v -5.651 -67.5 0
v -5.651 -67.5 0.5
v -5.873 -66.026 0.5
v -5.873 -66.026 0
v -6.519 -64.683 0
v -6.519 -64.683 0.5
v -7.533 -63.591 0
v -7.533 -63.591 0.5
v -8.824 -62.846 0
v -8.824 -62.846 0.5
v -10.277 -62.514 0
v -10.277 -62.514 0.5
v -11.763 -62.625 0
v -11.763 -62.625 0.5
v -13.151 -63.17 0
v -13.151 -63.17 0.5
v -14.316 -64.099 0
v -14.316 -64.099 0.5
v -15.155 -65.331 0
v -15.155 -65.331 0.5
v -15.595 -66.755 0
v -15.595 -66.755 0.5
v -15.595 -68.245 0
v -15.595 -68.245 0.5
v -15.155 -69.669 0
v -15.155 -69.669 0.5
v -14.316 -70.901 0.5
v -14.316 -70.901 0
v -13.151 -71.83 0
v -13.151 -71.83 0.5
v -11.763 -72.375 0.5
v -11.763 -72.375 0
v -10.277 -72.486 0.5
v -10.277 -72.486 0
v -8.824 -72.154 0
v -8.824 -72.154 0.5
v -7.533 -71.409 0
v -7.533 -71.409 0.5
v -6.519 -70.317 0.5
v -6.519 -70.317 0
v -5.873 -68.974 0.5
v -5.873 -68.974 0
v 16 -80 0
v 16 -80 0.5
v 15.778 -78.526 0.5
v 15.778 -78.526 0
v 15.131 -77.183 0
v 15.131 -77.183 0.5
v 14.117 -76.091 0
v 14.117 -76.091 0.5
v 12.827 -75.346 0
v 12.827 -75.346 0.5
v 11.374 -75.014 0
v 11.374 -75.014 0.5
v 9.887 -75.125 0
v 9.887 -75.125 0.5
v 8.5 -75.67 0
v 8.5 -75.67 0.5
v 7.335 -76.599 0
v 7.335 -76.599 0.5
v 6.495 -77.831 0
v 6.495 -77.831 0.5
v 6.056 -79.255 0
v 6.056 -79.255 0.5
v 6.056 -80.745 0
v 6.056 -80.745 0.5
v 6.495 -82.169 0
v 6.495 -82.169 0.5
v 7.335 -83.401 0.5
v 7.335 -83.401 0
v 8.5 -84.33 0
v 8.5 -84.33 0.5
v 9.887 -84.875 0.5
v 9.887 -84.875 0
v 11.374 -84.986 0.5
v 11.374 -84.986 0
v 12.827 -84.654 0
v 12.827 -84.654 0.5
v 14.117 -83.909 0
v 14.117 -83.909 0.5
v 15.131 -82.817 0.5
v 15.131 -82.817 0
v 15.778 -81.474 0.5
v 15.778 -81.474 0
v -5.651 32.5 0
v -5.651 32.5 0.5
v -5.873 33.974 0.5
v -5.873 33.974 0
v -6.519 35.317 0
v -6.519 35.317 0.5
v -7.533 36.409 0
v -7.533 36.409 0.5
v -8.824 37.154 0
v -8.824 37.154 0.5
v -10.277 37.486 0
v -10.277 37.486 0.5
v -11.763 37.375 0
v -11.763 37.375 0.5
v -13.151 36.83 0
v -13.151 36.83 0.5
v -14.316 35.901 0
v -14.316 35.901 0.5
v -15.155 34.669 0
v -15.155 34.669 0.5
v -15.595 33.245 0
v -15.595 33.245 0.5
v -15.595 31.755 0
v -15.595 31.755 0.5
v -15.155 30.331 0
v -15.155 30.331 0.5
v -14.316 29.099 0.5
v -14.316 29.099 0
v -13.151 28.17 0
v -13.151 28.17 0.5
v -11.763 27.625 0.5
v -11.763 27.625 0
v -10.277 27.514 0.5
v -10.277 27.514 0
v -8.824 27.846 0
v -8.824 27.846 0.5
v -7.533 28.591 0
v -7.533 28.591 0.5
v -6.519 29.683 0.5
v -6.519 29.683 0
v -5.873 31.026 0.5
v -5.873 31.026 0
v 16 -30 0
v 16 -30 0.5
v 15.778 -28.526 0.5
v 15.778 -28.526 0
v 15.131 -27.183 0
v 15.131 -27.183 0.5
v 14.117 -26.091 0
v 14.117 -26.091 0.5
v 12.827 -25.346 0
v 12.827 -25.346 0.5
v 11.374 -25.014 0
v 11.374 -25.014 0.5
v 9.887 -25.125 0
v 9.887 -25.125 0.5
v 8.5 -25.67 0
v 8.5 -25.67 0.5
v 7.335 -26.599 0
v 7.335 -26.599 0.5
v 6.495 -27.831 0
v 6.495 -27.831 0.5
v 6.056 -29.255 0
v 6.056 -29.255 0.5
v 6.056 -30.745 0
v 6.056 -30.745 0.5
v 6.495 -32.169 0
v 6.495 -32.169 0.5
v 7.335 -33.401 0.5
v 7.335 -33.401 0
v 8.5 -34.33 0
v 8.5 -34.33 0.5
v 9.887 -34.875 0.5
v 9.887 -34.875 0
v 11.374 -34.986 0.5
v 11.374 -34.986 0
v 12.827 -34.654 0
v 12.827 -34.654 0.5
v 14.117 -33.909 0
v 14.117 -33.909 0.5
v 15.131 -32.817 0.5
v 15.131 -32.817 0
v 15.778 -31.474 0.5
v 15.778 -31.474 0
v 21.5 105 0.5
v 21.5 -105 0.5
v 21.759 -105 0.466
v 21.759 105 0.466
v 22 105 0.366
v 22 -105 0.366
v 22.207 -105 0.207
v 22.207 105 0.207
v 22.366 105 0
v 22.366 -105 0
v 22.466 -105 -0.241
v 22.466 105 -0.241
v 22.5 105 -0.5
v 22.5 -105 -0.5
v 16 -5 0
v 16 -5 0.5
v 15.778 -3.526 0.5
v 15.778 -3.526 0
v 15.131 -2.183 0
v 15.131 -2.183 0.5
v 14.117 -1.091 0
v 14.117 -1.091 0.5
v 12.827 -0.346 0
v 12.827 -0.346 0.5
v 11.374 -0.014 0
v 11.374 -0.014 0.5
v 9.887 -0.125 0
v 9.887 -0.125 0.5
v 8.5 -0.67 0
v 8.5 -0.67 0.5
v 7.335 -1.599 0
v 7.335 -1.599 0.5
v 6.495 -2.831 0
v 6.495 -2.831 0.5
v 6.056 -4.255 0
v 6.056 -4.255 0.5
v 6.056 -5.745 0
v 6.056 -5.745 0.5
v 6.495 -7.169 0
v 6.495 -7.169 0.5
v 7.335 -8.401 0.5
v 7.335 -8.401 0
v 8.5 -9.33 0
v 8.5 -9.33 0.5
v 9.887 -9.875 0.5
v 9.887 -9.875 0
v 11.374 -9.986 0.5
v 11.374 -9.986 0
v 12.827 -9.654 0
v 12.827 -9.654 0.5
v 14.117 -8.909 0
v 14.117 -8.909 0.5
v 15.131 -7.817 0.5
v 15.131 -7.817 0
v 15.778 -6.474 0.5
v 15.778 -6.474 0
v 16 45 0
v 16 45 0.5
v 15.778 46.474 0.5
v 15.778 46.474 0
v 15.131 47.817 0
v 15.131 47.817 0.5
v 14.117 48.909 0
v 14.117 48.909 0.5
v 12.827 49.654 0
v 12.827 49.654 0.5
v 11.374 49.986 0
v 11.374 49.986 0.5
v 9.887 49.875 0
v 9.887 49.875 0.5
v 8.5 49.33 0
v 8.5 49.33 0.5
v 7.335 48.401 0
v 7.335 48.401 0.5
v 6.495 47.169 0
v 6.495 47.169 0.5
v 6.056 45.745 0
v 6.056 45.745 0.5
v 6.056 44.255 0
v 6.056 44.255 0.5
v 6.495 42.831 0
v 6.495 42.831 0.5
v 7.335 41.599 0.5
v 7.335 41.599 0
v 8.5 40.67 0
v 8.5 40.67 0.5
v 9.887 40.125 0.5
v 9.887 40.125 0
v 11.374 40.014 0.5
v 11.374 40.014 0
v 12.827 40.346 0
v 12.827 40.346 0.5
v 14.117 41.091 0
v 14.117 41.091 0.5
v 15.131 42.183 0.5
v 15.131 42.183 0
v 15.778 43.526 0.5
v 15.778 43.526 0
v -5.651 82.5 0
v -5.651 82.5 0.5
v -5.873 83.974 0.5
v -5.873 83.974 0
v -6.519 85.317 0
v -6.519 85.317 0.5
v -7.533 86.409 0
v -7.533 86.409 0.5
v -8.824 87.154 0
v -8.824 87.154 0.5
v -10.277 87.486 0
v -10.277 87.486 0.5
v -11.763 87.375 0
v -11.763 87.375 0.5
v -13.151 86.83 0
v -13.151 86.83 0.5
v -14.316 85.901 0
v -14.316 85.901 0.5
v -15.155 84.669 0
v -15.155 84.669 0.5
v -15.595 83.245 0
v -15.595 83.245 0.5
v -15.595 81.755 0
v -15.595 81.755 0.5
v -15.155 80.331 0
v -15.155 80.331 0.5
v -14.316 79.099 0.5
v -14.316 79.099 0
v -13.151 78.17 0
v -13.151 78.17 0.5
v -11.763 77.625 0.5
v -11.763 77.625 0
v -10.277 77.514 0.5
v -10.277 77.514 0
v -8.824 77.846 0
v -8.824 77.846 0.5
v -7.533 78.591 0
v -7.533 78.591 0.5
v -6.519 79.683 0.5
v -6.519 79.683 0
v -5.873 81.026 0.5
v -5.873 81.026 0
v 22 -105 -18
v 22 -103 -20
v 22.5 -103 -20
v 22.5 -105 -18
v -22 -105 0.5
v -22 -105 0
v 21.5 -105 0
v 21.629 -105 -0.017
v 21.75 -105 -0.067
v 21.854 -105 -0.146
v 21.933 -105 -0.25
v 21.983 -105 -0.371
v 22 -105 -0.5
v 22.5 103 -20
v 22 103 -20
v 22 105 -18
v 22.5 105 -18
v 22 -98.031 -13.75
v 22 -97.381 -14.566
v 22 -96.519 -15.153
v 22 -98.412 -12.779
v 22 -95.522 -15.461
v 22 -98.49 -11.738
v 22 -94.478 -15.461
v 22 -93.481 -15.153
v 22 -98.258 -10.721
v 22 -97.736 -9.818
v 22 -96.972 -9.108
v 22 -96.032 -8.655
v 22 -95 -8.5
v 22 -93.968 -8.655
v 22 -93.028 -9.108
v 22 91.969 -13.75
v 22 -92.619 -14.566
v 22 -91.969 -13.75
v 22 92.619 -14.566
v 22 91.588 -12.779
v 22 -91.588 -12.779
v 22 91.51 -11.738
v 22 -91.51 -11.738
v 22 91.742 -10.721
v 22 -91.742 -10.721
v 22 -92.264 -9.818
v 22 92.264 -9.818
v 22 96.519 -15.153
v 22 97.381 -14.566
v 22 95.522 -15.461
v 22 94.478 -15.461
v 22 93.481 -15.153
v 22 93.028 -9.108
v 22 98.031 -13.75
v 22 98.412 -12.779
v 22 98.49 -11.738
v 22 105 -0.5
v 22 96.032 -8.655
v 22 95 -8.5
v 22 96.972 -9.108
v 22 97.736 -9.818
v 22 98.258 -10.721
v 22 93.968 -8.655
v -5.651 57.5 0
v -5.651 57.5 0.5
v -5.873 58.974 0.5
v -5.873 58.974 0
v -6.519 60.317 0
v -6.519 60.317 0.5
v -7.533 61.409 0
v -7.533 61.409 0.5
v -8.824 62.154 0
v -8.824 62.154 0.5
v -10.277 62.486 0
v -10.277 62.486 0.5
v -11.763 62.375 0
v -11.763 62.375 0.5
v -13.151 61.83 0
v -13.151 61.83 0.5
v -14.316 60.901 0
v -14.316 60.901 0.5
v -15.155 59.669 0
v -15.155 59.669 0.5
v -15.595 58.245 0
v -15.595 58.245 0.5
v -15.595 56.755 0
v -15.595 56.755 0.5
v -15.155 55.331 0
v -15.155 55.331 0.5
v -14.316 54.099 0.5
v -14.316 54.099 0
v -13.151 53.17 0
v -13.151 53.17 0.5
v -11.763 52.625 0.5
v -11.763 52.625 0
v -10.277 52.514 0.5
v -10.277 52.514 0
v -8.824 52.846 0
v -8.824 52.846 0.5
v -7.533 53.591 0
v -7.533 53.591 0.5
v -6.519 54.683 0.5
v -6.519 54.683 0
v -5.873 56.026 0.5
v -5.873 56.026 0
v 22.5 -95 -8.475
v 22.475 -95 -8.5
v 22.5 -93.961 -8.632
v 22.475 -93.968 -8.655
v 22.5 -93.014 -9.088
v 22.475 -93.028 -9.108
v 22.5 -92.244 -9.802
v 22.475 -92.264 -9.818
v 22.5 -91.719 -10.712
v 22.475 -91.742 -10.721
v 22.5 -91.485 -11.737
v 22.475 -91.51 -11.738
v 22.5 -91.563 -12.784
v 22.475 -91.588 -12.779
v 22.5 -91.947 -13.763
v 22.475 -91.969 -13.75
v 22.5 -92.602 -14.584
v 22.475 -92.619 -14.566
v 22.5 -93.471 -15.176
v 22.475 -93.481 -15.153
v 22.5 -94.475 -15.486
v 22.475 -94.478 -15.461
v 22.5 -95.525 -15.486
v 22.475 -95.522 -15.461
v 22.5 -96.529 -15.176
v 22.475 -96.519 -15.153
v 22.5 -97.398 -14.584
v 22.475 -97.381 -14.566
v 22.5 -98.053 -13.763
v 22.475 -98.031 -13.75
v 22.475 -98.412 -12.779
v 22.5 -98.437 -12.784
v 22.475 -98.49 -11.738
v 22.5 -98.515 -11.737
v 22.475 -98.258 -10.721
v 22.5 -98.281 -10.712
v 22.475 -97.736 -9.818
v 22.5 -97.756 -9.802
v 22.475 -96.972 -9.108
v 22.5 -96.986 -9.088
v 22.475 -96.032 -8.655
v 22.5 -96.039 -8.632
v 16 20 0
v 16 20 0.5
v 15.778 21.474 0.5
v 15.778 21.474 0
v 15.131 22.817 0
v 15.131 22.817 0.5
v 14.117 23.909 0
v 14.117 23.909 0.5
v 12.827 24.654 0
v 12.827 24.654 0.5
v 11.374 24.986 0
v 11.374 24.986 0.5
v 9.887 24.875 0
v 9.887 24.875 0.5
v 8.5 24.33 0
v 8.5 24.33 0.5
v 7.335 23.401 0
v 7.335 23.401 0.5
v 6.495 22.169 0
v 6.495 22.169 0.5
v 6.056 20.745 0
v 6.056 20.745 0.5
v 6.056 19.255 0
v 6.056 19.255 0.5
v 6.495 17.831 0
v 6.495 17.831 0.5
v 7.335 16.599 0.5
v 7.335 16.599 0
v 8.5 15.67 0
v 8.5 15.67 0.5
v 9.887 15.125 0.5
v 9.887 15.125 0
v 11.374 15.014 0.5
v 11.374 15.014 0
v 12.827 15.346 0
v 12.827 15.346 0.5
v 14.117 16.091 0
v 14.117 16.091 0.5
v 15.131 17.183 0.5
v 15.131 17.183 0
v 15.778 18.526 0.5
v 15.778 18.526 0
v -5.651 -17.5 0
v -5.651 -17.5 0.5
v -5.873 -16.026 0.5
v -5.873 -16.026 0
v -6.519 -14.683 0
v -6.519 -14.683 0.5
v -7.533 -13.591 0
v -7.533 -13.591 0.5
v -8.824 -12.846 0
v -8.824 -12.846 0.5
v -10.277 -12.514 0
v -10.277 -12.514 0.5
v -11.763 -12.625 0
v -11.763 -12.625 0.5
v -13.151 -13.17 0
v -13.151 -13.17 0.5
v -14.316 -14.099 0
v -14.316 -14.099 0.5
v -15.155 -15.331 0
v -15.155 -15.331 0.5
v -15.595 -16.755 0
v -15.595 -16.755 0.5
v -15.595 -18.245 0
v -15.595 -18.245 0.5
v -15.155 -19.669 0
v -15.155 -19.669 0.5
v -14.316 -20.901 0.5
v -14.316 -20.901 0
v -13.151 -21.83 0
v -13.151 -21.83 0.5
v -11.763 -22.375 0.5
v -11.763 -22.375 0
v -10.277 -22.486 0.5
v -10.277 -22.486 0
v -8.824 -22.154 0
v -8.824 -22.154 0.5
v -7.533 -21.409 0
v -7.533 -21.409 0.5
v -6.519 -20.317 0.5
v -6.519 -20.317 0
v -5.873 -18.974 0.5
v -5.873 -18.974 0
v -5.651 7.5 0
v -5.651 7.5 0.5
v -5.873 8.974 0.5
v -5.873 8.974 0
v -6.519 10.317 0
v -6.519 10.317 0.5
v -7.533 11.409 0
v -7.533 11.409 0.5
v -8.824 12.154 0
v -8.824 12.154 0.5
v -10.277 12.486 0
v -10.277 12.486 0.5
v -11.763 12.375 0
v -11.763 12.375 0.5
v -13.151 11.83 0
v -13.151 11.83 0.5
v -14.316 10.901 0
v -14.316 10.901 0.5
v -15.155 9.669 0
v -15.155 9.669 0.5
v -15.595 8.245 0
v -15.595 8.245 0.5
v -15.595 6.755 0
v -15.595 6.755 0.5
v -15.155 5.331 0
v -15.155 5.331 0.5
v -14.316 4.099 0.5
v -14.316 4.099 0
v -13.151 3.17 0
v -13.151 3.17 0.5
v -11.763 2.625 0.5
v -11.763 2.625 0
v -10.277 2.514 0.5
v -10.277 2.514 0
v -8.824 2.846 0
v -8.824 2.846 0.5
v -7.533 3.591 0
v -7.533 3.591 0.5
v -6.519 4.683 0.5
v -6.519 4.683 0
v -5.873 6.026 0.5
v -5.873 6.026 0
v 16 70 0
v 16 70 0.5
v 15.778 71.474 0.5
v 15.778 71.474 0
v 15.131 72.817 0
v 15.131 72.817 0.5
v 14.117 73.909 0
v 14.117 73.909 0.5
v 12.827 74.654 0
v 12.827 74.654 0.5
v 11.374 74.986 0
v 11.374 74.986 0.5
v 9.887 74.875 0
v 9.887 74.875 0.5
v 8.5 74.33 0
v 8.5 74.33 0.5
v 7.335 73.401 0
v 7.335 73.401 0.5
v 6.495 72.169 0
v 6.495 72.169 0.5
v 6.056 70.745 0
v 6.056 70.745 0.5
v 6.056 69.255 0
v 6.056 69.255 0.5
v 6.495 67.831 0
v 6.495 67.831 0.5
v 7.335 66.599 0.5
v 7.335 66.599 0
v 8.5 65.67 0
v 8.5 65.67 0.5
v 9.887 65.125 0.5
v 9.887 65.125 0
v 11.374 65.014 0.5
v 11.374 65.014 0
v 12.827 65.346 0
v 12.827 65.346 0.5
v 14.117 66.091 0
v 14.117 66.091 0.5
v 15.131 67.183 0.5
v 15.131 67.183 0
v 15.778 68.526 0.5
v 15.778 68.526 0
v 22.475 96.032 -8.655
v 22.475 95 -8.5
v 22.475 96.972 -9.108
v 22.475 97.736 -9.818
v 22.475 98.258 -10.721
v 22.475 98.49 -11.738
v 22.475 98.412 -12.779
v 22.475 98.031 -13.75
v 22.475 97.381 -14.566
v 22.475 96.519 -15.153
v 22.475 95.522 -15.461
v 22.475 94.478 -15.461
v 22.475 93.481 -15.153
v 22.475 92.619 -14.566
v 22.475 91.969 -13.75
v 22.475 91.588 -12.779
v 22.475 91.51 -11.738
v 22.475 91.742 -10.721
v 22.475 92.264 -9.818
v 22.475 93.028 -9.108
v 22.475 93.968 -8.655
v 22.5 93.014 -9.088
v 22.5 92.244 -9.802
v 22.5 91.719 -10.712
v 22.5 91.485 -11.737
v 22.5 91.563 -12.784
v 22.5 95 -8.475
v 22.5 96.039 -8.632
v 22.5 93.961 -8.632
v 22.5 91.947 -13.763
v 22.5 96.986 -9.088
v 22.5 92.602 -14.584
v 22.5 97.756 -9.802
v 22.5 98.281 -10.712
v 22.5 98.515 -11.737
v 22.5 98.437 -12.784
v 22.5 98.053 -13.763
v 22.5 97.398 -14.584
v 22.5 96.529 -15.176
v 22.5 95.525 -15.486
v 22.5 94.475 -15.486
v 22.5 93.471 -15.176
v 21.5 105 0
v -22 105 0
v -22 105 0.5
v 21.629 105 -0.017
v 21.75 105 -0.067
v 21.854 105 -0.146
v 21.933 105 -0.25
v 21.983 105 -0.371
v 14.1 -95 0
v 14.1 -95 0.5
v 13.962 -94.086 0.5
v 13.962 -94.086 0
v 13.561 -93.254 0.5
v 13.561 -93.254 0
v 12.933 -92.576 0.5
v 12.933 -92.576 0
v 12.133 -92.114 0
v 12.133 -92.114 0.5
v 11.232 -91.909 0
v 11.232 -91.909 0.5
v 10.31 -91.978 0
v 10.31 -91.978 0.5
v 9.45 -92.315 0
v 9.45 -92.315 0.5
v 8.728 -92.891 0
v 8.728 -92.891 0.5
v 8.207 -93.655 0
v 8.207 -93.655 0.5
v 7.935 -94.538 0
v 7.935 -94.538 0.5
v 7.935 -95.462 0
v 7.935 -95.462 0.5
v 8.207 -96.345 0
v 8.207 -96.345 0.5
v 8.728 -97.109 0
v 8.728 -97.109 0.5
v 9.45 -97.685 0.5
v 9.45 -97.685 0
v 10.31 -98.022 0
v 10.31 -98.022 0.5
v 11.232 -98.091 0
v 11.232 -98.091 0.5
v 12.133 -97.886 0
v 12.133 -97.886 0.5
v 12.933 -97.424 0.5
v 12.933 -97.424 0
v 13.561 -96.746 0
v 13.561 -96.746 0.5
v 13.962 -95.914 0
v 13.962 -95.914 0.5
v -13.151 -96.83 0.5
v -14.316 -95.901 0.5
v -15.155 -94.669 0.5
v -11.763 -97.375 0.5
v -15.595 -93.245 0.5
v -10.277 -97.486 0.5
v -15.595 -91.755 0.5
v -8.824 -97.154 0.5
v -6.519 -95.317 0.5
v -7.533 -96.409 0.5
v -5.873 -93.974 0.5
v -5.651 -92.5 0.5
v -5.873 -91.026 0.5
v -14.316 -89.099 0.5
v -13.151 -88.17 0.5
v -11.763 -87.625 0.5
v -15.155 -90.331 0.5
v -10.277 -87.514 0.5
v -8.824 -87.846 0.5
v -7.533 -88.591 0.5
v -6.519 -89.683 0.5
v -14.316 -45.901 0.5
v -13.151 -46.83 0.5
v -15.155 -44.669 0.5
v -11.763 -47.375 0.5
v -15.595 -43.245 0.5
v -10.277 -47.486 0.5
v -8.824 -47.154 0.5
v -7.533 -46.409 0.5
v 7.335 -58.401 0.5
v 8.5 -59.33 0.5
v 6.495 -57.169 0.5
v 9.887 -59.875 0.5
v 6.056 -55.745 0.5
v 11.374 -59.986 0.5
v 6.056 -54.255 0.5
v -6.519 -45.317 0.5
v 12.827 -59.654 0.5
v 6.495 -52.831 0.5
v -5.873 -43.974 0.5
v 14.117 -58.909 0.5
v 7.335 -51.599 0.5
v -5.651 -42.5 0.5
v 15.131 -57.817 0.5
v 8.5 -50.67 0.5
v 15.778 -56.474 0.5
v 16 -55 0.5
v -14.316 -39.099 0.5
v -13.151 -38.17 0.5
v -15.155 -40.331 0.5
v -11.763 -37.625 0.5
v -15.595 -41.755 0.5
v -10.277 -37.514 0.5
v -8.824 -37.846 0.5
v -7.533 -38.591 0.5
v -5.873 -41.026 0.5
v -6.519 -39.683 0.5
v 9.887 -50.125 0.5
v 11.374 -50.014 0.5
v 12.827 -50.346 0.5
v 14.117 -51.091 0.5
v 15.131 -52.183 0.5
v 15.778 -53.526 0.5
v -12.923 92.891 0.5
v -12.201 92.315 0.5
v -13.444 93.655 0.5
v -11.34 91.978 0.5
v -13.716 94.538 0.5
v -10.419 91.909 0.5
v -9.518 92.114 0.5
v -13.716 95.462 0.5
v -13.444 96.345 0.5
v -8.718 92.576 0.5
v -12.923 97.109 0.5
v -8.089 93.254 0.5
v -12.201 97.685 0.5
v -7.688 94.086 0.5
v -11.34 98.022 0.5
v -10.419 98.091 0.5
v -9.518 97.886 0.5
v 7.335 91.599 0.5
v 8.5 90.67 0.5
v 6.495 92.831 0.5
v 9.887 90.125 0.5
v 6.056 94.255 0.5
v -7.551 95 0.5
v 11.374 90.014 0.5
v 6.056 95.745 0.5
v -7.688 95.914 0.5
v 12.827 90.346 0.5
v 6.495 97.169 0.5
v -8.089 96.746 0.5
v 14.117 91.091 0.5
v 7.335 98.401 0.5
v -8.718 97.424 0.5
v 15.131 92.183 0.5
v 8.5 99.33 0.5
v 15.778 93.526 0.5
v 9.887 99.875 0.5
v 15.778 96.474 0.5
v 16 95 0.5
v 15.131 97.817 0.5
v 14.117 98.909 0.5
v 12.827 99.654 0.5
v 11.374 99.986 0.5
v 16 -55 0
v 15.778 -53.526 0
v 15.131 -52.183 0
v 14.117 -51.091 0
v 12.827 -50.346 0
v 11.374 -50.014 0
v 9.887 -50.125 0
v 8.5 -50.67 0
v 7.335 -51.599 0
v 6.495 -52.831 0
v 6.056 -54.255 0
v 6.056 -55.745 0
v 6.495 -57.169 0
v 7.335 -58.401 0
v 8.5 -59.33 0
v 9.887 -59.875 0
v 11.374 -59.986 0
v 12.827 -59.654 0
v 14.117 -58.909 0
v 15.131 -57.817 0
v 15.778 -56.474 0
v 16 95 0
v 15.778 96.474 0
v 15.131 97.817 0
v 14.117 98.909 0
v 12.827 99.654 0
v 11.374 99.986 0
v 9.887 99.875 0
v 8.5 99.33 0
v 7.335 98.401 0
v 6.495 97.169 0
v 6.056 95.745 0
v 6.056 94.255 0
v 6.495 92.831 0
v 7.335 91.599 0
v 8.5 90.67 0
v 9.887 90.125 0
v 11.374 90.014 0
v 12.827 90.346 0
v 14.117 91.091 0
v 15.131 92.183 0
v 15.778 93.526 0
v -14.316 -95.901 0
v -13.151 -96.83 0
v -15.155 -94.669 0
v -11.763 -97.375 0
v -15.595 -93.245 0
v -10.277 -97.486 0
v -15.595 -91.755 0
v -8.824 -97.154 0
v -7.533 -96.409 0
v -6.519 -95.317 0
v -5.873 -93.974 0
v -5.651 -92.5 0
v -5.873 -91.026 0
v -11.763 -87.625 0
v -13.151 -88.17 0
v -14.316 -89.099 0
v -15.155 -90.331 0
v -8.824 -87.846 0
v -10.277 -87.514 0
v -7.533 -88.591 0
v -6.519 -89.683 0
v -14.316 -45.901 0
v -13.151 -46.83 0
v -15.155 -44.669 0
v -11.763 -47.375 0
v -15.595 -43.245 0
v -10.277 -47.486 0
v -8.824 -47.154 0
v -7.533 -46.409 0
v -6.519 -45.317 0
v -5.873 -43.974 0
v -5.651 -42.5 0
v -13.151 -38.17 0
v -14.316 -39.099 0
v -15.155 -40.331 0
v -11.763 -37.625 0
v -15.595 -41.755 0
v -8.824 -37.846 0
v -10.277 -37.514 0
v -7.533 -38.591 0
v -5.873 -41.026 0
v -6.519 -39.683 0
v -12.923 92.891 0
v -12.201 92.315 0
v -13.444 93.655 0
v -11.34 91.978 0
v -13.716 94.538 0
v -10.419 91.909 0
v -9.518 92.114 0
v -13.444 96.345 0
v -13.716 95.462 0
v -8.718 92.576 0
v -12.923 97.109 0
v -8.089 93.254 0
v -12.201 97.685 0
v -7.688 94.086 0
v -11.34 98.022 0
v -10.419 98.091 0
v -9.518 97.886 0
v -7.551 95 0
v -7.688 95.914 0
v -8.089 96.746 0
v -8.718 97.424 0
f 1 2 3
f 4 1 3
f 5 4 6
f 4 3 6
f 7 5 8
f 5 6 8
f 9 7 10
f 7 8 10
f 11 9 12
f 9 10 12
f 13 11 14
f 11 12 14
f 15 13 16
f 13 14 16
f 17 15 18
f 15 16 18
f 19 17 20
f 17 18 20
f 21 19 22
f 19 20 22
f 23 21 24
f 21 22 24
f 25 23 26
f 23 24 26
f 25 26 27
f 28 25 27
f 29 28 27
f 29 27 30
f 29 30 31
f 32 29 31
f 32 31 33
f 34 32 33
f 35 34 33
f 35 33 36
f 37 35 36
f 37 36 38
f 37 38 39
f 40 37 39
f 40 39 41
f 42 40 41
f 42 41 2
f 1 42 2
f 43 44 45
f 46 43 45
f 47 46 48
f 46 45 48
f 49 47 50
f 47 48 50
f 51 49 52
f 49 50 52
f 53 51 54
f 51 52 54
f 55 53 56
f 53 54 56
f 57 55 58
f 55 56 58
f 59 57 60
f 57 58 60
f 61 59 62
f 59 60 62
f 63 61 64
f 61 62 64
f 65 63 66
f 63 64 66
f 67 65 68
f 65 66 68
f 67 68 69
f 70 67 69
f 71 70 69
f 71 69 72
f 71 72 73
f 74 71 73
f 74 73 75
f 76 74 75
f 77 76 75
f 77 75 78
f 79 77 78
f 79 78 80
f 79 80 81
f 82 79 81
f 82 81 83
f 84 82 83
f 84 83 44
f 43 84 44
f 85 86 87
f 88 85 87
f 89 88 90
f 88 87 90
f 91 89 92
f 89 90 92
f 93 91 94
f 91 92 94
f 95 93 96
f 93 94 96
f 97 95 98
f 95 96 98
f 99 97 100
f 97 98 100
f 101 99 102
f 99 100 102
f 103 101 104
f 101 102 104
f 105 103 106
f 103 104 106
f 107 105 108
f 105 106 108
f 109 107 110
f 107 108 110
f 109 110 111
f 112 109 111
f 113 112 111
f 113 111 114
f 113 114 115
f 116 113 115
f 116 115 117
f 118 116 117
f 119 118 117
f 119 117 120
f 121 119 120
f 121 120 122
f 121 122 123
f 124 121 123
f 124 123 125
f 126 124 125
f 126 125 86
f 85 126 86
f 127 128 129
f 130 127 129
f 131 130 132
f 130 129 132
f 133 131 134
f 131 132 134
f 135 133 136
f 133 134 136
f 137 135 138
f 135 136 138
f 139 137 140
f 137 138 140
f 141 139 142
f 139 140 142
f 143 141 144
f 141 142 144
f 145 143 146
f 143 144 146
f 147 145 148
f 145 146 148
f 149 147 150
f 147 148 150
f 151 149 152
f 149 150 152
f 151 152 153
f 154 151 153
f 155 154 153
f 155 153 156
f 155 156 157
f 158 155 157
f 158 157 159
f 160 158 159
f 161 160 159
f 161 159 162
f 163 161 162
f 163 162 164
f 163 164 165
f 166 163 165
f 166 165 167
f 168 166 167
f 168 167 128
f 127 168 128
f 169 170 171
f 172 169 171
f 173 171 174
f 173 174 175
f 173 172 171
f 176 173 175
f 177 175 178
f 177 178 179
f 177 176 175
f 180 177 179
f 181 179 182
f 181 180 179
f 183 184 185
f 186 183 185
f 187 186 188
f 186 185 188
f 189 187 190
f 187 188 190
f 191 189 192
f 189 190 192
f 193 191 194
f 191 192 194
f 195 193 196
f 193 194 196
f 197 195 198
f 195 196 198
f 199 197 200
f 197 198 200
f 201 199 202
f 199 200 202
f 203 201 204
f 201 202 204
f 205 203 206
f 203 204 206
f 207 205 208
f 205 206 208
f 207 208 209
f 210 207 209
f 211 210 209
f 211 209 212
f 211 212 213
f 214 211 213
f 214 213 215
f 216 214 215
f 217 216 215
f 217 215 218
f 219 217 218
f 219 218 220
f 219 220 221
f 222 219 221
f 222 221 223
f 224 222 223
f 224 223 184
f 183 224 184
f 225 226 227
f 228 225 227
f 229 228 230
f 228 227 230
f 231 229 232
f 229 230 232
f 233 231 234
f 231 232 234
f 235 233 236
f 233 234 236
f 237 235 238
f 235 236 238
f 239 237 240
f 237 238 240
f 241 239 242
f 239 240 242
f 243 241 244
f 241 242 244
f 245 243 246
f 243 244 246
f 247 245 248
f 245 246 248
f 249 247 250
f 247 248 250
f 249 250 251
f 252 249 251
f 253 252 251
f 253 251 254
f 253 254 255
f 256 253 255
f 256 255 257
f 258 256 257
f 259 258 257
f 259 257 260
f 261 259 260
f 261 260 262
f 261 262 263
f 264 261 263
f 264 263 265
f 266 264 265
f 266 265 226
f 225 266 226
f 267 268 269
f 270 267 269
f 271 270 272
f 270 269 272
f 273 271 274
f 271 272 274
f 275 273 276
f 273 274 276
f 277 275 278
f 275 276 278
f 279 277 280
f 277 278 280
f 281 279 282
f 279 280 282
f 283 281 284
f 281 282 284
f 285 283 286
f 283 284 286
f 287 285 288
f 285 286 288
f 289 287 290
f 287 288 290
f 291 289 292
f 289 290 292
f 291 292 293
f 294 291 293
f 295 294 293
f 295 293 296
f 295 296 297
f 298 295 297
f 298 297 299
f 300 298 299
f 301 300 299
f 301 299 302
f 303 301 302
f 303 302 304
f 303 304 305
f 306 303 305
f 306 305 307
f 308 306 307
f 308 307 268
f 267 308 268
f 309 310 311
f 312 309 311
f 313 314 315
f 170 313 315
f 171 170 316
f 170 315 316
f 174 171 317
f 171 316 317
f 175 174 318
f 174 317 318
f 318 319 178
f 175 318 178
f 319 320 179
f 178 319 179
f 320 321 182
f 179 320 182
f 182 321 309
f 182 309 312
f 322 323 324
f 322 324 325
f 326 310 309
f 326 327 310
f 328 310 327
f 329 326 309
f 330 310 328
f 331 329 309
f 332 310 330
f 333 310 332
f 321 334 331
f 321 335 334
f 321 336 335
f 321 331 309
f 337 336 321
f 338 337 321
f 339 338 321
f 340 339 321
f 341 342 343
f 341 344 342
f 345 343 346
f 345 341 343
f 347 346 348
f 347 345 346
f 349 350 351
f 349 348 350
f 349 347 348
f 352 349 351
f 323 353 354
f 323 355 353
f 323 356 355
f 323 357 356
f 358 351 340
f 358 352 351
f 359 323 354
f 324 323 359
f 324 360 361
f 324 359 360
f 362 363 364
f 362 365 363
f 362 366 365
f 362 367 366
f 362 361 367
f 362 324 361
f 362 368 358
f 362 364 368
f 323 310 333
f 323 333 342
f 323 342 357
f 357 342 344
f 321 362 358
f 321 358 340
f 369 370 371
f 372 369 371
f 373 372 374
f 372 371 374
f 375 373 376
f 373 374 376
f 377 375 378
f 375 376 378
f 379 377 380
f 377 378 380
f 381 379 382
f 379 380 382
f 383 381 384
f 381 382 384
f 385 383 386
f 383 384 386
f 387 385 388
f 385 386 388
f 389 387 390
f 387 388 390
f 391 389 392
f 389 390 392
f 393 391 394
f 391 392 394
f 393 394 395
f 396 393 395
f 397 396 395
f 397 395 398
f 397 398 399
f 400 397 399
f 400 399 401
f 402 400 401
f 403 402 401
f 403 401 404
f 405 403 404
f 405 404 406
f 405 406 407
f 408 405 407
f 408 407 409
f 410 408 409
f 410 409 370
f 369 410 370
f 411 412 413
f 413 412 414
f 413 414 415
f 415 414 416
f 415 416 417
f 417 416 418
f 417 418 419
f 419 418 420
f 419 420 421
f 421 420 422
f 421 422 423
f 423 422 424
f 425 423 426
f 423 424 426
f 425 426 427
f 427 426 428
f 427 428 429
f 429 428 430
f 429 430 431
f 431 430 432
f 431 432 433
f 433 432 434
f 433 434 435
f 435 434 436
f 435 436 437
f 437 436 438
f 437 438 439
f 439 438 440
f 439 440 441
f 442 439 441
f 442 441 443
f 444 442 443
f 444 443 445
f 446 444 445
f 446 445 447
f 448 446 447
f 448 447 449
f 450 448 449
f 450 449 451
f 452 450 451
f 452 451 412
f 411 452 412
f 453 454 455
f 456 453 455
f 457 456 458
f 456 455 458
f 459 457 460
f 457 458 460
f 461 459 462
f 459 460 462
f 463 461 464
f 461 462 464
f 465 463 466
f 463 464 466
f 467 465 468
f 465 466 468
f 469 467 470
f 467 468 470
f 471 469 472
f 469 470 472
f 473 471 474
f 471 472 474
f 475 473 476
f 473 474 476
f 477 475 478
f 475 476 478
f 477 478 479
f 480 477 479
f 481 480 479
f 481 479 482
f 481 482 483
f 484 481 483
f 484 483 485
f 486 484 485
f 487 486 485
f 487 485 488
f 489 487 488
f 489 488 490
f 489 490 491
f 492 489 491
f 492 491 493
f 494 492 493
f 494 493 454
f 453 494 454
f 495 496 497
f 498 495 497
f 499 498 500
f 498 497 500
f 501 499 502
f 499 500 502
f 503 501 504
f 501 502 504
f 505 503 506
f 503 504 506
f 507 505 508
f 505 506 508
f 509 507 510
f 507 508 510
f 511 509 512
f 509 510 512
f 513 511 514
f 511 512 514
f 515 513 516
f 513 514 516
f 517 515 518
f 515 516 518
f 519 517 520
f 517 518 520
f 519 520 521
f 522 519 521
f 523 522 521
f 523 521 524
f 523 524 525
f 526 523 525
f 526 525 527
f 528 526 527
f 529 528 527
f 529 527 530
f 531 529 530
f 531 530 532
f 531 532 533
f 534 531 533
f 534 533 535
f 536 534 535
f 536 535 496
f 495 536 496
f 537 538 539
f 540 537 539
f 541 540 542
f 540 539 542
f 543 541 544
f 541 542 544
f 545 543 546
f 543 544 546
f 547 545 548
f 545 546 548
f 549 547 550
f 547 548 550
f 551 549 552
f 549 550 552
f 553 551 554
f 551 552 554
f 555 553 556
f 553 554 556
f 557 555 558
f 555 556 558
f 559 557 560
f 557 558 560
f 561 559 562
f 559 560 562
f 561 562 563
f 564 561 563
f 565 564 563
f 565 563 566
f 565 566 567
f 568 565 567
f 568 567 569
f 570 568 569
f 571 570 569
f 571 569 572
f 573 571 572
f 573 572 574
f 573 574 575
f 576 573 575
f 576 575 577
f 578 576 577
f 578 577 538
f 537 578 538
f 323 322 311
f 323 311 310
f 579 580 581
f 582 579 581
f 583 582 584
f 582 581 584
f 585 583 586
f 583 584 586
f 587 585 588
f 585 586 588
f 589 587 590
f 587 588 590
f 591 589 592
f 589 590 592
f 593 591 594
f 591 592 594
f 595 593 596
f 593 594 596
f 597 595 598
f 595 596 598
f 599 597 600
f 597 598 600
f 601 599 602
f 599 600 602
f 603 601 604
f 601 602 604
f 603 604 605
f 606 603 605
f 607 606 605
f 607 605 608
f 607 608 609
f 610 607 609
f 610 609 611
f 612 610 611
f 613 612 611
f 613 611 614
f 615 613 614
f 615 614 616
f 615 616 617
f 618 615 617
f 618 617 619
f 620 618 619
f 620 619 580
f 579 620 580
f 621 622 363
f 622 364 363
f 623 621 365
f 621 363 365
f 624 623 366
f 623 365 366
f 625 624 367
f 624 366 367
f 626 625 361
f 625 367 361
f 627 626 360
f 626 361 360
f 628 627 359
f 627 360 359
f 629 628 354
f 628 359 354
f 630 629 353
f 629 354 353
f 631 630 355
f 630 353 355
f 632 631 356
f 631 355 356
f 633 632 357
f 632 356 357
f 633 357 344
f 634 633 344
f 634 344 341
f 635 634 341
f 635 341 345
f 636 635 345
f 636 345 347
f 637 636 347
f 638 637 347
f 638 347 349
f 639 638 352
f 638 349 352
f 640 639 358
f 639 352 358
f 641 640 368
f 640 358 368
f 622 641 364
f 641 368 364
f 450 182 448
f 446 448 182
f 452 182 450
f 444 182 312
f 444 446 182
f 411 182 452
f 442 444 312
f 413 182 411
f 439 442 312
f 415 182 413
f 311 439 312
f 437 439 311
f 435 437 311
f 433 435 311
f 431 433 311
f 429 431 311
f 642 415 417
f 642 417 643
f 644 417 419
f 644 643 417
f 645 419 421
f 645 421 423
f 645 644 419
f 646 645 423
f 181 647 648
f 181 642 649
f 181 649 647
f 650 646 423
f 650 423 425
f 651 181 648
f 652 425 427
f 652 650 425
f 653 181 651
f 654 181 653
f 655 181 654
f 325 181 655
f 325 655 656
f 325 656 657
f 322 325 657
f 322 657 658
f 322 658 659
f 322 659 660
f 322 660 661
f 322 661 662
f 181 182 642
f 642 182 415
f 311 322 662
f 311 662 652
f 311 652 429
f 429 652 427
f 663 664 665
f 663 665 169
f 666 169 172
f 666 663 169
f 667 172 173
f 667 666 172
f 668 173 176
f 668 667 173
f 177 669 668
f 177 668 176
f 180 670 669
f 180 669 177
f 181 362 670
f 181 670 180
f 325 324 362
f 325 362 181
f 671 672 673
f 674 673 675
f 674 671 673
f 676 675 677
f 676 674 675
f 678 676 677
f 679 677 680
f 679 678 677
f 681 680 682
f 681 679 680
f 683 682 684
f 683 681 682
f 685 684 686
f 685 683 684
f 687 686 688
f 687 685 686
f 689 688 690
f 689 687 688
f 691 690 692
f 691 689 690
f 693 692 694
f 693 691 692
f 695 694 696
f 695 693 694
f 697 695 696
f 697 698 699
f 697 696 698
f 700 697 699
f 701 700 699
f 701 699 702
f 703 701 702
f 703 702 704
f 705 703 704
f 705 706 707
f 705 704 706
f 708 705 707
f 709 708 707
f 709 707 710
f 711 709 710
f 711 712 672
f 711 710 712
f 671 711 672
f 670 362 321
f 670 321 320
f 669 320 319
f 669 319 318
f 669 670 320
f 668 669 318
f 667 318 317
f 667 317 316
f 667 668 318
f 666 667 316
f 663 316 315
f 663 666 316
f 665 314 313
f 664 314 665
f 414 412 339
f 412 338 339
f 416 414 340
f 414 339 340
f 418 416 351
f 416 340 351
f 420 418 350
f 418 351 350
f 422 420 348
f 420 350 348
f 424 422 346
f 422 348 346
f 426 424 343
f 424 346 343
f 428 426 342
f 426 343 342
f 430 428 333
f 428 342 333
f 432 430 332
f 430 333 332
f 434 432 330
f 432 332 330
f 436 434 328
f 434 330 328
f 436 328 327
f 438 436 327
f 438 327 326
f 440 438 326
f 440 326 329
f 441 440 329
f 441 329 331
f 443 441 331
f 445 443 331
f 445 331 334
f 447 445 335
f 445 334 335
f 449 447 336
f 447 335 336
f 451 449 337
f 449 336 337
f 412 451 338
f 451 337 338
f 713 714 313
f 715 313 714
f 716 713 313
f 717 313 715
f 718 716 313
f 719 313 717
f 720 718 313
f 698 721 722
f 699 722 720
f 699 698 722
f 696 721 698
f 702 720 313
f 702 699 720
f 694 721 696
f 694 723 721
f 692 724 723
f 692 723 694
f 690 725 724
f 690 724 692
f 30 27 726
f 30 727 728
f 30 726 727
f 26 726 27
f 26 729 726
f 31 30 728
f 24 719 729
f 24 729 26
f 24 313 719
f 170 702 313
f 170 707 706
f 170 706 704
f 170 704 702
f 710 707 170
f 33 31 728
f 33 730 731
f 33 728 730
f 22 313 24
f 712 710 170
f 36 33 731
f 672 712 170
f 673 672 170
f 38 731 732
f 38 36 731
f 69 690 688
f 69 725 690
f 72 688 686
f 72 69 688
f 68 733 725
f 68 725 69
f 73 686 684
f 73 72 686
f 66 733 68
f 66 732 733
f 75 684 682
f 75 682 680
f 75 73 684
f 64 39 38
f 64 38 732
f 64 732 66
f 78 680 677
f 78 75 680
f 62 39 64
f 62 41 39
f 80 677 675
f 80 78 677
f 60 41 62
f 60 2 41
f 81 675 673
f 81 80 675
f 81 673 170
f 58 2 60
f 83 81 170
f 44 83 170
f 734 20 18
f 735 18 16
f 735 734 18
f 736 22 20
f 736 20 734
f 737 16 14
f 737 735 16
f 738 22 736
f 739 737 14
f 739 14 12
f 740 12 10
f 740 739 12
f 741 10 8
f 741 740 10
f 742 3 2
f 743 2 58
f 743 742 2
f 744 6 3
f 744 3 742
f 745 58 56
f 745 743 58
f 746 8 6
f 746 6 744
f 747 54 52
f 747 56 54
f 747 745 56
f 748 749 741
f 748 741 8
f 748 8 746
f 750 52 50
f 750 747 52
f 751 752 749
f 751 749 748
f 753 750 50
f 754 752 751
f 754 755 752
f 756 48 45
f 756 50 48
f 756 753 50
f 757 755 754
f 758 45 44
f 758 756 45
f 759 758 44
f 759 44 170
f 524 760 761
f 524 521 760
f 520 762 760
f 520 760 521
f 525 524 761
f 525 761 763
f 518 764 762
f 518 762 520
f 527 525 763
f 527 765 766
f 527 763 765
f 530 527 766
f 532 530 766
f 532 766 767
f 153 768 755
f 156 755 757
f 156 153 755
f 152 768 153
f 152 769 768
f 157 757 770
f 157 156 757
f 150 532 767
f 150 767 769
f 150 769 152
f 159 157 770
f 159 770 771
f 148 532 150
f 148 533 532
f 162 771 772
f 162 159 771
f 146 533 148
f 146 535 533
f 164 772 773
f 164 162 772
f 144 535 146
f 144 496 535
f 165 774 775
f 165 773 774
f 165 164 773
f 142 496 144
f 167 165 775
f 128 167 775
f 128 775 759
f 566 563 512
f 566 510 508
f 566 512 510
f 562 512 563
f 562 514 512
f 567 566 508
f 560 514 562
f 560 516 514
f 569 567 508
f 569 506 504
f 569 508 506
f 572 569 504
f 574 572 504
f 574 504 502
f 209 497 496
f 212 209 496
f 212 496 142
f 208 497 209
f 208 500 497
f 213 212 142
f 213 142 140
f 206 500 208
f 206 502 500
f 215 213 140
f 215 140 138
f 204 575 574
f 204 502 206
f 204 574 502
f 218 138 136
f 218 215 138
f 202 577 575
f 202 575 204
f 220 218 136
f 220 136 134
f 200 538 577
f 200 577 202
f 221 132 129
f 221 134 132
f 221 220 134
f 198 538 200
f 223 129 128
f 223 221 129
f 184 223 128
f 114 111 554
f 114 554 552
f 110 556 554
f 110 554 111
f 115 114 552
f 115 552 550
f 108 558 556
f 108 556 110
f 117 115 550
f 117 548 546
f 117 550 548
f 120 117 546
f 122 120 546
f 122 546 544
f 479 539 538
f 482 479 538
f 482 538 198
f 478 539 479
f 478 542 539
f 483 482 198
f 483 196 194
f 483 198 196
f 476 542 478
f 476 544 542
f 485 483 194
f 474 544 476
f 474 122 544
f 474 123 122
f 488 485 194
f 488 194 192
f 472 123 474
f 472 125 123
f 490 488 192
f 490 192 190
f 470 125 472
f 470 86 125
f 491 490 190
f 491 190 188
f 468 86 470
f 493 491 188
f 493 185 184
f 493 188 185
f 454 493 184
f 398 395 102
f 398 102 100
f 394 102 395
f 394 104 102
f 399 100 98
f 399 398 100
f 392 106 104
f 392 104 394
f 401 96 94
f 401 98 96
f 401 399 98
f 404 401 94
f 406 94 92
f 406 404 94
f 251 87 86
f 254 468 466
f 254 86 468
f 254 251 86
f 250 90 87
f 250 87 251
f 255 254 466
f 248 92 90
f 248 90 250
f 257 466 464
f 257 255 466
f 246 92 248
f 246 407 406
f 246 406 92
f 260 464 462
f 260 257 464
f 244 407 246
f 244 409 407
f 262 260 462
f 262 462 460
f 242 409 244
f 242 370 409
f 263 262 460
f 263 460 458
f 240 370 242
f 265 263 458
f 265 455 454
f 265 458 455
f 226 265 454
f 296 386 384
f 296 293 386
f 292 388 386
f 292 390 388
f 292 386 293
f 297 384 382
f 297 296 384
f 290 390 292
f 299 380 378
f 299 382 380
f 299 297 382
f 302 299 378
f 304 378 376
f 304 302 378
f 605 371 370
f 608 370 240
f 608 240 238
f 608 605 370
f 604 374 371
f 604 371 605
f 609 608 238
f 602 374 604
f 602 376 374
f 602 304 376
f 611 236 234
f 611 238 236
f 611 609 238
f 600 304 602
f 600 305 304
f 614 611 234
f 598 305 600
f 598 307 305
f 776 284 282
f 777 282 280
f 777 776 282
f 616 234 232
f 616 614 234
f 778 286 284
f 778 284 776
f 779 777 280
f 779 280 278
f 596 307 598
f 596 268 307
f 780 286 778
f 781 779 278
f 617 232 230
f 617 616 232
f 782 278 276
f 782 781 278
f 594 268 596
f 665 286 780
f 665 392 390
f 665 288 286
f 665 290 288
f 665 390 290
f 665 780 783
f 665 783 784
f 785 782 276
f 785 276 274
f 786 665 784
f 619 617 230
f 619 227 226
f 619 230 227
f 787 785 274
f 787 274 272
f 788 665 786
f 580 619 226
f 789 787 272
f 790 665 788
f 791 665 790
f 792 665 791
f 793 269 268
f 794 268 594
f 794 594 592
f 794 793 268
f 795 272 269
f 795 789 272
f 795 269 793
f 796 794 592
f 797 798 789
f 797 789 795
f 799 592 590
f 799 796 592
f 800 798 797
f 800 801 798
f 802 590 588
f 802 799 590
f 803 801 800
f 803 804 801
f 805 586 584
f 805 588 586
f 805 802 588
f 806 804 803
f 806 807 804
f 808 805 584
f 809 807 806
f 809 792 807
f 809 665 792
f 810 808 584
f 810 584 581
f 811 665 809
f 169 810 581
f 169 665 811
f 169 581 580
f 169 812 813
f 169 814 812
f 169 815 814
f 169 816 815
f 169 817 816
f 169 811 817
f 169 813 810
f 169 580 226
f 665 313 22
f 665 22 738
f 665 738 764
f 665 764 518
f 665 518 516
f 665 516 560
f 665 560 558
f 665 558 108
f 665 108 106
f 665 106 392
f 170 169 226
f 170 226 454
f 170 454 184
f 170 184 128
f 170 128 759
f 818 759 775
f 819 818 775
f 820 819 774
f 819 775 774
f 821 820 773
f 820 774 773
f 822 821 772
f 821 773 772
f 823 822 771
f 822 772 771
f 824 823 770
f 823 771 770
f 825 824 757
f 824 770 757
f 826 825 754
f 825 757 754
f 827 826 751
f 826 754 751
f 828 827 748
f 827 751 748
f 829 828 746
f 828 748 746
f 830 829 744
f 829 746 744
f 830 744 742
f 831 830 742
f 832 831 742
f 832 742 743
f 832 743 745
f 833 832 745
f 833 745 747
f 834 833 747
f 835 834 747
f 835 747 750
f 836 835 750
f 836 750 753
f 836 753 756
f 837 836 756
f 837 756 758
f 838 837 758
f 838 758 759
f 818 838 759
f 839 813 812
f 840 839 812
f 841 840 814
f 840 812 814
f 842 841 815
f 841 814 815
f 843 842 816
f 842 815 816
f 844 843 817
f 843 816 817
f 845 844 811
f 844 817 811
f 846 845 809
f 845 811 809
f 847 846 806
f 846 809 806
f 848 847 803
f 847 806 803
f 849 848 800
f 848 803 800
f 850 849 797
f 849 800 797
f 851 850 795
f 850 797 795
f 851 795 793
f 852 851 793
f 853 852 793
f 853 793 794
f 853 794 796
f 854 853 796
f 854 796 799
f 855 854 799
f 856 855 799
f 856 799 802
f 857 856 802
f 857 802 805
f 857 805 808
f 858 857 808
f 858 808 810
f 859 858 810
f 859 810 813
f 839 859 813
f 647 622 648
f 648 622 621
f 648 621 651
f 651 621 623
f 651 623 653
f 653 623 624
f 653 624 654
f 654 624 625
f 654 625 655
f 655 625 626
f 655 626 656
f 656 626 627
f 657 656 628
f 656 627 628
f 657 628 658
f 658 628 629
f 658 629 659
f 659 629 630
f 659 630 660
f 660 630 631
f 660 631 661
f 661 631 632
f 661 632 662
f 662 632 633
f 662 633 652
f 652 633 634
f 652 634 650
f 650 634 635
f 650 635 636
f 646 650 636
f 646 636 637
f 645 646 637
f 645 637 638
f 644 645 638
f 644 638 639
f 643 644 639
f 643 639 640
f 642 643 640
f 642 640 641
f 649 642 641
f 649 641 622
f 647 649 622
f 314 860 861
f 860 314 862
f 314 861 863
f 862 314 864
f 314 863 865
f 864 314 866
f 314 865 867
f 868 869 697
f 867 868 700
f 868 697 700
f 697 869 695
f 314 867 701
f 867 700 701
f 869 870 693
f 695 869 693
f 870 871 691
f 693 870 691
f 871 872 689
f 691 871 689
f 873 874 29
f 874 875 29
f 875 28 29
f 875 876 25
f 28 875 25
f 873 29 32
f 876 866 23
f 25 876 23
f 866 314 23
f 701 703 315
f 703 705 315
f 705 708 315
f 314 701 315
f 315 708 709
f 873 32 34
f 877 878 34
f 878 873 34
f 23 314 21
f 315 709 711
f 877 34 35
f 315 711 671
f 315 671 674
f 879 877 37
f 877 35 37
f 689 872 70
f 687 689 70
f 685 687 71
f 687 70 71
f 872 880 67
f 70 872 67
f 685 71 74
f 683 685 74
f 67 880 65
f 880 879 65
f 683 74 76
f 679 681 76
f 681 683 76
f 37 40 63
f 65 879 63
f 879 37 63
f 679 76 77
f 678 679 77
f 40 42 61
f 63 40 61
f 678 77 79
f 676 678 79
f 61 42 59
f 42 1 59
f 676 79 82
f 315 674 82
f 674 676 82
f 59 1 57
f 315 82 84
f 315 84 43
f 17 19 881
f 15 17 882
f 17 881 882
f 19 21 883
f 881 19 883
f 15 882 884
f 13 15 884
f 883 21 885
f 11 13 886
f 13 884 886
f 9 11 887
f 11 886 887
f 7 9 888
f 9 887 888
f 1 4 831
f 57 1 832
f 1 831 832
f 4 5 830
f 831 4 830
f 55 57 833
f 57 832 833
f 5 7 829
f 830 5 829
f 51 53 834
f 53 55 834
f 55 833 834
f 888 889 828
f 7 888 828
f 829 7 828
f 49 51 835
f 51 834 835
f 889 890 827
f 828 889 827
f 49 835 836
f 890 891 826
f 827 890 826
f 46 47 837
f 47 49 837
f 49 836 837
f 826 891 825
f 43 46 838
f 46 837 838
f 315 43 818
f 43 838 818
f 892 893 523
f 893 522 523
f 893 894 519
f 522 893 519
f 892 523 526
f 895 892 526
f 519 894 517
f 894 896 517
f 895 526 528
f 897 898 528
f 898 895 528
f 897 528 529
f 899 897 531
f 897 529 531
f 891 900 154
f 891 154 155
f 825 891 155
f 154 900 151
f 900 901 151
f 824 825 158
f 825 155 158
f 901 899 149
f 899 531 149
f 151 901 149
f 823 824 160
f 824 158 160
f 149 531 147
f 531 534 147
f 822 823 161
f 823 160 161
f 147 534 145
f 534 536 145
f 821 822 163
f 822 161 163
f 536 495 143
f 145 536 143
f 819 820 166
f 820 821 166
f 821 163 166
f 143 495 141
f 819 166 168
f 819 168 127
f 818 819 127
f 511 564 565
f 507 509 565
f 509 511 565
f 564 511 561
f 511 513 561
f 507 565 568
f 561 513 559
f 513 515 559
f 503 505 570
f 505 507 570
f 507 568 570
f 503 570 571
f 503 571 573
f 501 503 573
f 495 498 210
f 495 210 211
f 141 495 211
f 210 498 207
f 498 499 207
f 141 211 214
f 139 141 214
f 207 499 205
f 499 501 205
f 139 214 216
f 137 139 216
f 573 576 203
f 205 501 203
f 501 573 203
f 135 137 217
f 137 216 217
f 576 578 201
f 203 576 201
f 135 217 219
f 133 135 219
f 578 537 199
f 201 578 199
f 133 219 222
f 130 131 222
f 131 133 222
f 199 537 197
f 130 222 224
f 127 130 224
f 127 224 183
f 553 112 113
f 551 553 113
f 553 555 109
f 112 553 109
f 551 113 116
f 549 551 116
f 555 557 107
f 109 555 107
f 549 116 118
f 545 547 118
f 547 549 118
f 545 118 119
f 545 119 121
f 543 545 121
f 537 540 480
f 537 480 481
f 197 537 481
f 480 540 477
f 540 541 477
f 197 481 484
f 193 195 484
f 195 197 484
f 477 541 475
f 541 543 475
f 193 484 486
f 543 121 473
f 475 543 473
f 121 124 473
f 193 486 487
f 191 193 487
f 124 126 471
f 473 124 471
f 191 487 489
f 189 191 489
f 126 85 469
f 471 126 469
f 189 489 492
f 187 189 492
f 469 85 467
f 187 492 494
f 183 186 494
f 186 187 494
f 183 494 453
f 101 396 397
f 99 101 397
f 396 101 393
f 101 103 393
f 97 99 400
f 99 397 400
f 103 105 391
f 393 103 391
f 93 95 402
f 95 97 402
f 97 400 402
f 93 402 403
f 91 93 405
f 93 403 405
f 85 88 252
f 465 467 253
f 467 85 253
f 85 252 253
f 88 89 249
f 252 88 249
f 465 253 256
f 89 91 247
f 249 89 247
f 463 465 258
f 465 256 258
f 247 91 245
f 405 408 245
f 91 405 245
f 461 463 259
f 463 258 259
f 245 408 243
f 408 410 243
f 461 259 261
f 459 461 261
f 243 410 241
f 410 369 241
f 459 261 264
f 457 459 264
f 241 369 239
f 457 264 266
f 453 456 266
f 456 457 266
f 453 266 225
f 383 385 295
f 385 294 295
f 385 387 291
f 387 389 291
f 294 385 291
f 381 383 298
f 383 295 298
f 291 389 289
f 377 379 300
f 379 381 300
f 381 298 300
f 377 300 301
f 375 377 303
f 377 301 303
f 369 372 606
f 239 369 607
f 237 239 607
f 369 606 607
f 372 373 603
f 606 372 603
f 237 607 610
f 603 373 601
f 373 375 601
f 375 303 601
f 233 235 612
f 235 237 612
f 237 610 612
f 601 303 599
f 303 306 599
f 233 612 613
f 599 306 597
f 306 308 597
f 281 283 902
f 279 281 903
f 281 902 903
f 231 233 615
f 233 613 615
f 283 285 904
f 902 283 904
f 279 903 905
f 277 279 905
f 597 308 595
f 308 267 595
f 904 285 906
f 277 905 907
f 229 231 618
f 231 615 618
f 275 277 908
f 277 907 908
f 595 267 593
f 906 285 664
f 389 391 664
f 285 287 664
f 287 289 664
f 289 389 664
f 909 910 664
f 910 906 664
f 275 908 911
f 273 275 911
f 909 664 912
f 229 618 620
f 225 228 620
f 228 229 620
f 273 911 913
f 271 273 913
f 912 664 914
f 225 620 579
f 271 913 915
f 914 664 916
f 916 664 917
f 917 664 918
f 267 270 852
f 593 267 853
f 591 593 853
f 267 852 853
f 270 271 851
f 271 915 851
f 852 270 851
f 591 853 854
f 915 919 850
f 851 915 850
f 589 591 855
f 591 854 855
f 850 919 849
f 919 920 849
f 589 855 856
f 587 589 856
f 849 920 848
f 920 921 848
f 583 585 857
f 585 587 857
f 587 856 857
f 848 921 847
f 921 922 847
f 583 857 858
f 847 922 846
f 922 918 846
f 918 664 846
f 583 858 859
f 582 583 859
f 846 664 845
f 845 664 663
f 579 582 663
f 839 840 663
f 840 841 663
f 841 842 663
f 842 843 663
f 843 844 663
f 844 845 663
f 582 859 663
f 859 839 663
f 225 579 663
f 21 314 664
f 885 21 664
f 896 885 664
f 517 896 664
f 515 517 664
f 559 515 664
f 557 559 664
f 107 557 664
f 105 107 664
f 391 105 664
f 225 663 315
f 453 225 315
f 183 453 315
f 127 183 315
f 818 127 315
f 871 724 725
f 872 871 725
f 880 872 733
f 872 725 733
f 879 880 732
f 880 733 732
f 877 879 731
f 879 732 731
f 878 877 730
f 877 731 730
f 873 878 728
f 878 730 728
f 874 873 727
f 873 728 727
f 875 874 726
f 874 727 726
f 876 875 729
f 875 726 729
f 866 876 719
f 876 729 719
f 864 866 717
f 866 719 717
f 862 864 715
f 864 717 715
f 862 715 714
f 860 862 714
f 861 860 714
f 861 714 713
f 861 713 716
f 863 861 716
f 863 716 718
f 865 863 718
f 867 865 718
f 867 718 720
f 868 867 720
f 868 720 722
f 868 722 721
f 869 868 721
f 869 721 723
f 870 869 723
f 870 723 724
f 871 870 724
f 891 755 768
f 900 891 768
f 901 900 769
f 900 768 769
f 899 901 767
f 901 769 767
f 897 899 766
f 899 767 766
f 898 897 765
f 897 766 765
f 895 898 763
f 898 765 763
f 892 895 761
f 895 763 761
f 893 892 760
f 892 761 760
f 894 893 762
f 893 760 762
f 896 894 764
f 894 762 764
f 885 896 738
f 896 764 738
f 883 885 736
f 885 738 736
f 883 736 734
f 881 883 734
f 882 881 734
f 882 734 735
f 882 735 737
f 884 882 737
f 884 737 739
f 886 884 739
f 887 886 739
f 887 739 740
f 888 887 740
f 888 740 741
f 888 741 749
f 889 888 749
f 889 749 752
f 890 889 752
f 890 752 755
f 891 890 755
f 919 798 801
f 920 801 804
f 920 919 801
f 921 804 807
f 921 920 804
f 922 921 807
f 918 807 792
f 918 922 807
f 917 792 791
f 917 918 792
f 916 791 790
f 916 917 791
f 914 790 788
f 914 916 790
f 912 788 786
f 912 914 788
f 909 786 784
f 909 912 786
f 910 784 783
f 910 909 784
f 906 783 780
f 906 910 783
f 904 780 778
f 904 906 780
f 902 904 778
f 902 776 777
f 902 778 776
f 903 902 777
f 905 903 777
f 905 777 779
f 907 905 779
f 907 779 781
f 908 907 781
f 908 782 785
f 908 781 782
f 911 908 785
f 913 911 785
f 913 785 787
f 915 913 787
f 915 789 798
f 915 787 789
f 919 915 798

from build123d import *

# Parameters (mm, degrees)
SKETCH2_W                          = 44
SKETCH2_H                          = 210
BOSS_EXTRUDE1_DEPTH                = 0.5
SKETCH3_R                          = 5
CUT_EXTRUDE1_DEPTH                 = 108.281172626
LPATTERN1_COUNT                    = 8
LPATTERN1_PITCH                    = 25
EDGE_FLANGE1_STRIP_W               = 3
EDGE_FLANGE1_STRIP_H               = 0.5
EDGE_FLANGE1_STRIP_CUT_DEPTH       = 210
EDGE_FLANGE1_DEPTH                 = 210
F_7_0_7_DIAMETER_HOLE1_D           = 7
F_7_0_7_DIAMETER_HOLE1_DEPTH       = 60
F_7_0_7_DIAMETER_HOLE1_CSINK_D     = 7.05
F_7_0_7_DIAMETER_HOLE1_CSINK_ANGLE = 90
F_7_0_7_DIAMETER_HOLE1_TIP         = 2.103012167
BREAK_CORNER1_START                = 86.974134086
BREAK_CORNER1_OUTLINE_W            = 3
BREAK_CORNER1_OUTLINE_H            = 149.974134086
BREAK_CORNER1_DEPTH                = 1.414213562
BREAK_CORNER1_START_2              = -61.518289963
BREAK_CORNER1_2_OUTLINE_W          = 3
BREAK_CORNER1_2_OUTLINE_H          = 2.025865914
BREAK_CORNER1_2_DEPTH              = 2.828427125
SKETCH17_R                         = 3.1
CUT_EXTRUDE2_DEPTH                 = 10


# Read off the part's stored shape, not the designer's step: Break-Corner1
# Sheet-metal steps are written as plain solids
with BuildPart() as part:
    # Sketch2 → Boss-Extrude1 (new body)
    with BuildSketch(Plane.XY):
        Rectangle(SKETCH2_W, SKETCH2_H)
    extrude(amount=BOSS_EXTRUDE1_DEPTH)

    # Sketch3 → Cut-Extrude1 (cut, through all)
    with BuildSketch(Plane.XY.offset(0.5)):
        with Locations((11, 95)):
            Circle(SKETCH3_R)
        with Locations((-10.650635095, 82.5)):
            Circle(SKETCH3_R)
    cut_extrude1 = extrude(amount=-CUT_EXTRUDE1_DEPTH, mode=Mode.SUBTRACT)

    # LPattern1: Cut-Extrude1 ×8
    with Locations(*[(0, -i * LPATTERN1_PITCH, 0) for i in range(1, LPATTERN1_COUNT)]):
        add(cut_extrude1, mode=Mode.SUBTRACT)

    # Edge-Flange1 strip (across the edge) → Edge-Flange1 strip cut (cut)
    with BuildSketch(Plane(origin=(22, 105, 0), x_dir=(-1, 0, 0), z_dir=(0, -1, 0))):
        with Locations((-1, -0.25)):
            Rectangle(EDGE_FLANGE1_STRIP_W, EDGE_FLANGE1_STRIP_H)
    extrude(amount=EDGE_FLANGE1_STRIP_CUT_DEPTH, mode=Mode.SUBTRACT)

    # Edge-Flange1 section (across the edge) → Edge-Flange1 (add)
    with BuildSketch(Plane(origin=(22, 105, 0), x_dir=(-1, 0, 0), z_dir=(0, -1, 0))):
        with BuildLine():
            Line((-0.5, 0.5), (-0.5, 20))
            Line((-0.5, 20), (0, 20))
            Line((0, 20), (0, 0.5))
            ThreePointArc((0, 0.5), (0.146446609, 0.146446609), (0.5, 0))
            Line((0.5, 0), (0.5, -0.5))
            ThreePointArc((0.5, -0.5), (-0.207106781, -0.207106781), (-0.5, 0.5))
        make_face()
    extrude(amount=EDGE_FLANGE1_DEPTH)

    # Ø7.0 (7) Diameter Hole1
    with Locations(Plane(origin=(22.5, 0, 0), x_dir=(0, 0, -1), z_dir=(1, 0, 0))):
        with Locations((12, 95), (12, -95)):
            CounterSinkHole(F_7_0_7_DIAMETER_HOLE1_D / 2, F_7_0_7_DIAMETER_HOLE1_CSINK_D / 2, depth=F_7_0_7_DIAMETER_HOLE1_DEPTH, counter_sink_angle=F_7_0_7_DIAMETER_HOLE1_CSINK_ANGLE)
            with Locations((0, 0, -(F_7_0_7_DIAMETER_HOLE1_DEPTH + F_7_0_7_DIAMETER_HOLE1_TIP / 2))):  # 118° drill point
                Cone(0, F_7_0_7_DIAMETER_HOLE1_D / 2, F_7_0_7_DIAMETER_HOLE1_TIP, mode=Mode.SUBTRACT)

    # Break-Corner1 outline → Break-Corner1 (cut)
    with BuildSketch(Plane(origin=(0, 0, 0), x_dir=(1, 0, 0), z_dir=(0, 0.707106781186545, -0.70710678118655)).offset(BREAK_CORNER1_START)):
        with Locations((22.5, 11.987067043)):
            Rectangle(BREAK_CORNER1_OUTLINE_W, BREAK_CORNER1_OUTLINE_H)
    extrude(amount=BREAK_CORNER1_DEPTH, mode=Mode.SUBTRACT)

    # Break-Corner1 2 outline → Break-Corner1 2 (cut)
    with BuildSketch(Plane(origin=(0, 0, 0), x_dir=(1, 0, 0), z_dir=(0, 0.707106781186545, -0.70710678118655)).offset(BREAK_CORNER1_START_2)):
        with Locations((22.5, 87.987067043)):
            Rectangle(BREAK_CORNER1_2_OUTLINE_W, BREAK_CORNER1_2_OUTLINE_H)
    extrude(amount=BREAK_CORNER1_2_DEPTH, mode=Mode.SUBTRACT)

    # Sketch17 → Cut-Extrude2 (cut)
    with BuildSketch(Plane.XY):
        with Locations((-10.650635095, 95)):
            Circle(SKETCH17_R)
        with Locations((11, -95)):
            Circle(SKETCH17_R)
    extrude(amount=CUT_EXTRUDE2_DEPTH, mode=Mode.SUBTRACT)


solid = part.part
